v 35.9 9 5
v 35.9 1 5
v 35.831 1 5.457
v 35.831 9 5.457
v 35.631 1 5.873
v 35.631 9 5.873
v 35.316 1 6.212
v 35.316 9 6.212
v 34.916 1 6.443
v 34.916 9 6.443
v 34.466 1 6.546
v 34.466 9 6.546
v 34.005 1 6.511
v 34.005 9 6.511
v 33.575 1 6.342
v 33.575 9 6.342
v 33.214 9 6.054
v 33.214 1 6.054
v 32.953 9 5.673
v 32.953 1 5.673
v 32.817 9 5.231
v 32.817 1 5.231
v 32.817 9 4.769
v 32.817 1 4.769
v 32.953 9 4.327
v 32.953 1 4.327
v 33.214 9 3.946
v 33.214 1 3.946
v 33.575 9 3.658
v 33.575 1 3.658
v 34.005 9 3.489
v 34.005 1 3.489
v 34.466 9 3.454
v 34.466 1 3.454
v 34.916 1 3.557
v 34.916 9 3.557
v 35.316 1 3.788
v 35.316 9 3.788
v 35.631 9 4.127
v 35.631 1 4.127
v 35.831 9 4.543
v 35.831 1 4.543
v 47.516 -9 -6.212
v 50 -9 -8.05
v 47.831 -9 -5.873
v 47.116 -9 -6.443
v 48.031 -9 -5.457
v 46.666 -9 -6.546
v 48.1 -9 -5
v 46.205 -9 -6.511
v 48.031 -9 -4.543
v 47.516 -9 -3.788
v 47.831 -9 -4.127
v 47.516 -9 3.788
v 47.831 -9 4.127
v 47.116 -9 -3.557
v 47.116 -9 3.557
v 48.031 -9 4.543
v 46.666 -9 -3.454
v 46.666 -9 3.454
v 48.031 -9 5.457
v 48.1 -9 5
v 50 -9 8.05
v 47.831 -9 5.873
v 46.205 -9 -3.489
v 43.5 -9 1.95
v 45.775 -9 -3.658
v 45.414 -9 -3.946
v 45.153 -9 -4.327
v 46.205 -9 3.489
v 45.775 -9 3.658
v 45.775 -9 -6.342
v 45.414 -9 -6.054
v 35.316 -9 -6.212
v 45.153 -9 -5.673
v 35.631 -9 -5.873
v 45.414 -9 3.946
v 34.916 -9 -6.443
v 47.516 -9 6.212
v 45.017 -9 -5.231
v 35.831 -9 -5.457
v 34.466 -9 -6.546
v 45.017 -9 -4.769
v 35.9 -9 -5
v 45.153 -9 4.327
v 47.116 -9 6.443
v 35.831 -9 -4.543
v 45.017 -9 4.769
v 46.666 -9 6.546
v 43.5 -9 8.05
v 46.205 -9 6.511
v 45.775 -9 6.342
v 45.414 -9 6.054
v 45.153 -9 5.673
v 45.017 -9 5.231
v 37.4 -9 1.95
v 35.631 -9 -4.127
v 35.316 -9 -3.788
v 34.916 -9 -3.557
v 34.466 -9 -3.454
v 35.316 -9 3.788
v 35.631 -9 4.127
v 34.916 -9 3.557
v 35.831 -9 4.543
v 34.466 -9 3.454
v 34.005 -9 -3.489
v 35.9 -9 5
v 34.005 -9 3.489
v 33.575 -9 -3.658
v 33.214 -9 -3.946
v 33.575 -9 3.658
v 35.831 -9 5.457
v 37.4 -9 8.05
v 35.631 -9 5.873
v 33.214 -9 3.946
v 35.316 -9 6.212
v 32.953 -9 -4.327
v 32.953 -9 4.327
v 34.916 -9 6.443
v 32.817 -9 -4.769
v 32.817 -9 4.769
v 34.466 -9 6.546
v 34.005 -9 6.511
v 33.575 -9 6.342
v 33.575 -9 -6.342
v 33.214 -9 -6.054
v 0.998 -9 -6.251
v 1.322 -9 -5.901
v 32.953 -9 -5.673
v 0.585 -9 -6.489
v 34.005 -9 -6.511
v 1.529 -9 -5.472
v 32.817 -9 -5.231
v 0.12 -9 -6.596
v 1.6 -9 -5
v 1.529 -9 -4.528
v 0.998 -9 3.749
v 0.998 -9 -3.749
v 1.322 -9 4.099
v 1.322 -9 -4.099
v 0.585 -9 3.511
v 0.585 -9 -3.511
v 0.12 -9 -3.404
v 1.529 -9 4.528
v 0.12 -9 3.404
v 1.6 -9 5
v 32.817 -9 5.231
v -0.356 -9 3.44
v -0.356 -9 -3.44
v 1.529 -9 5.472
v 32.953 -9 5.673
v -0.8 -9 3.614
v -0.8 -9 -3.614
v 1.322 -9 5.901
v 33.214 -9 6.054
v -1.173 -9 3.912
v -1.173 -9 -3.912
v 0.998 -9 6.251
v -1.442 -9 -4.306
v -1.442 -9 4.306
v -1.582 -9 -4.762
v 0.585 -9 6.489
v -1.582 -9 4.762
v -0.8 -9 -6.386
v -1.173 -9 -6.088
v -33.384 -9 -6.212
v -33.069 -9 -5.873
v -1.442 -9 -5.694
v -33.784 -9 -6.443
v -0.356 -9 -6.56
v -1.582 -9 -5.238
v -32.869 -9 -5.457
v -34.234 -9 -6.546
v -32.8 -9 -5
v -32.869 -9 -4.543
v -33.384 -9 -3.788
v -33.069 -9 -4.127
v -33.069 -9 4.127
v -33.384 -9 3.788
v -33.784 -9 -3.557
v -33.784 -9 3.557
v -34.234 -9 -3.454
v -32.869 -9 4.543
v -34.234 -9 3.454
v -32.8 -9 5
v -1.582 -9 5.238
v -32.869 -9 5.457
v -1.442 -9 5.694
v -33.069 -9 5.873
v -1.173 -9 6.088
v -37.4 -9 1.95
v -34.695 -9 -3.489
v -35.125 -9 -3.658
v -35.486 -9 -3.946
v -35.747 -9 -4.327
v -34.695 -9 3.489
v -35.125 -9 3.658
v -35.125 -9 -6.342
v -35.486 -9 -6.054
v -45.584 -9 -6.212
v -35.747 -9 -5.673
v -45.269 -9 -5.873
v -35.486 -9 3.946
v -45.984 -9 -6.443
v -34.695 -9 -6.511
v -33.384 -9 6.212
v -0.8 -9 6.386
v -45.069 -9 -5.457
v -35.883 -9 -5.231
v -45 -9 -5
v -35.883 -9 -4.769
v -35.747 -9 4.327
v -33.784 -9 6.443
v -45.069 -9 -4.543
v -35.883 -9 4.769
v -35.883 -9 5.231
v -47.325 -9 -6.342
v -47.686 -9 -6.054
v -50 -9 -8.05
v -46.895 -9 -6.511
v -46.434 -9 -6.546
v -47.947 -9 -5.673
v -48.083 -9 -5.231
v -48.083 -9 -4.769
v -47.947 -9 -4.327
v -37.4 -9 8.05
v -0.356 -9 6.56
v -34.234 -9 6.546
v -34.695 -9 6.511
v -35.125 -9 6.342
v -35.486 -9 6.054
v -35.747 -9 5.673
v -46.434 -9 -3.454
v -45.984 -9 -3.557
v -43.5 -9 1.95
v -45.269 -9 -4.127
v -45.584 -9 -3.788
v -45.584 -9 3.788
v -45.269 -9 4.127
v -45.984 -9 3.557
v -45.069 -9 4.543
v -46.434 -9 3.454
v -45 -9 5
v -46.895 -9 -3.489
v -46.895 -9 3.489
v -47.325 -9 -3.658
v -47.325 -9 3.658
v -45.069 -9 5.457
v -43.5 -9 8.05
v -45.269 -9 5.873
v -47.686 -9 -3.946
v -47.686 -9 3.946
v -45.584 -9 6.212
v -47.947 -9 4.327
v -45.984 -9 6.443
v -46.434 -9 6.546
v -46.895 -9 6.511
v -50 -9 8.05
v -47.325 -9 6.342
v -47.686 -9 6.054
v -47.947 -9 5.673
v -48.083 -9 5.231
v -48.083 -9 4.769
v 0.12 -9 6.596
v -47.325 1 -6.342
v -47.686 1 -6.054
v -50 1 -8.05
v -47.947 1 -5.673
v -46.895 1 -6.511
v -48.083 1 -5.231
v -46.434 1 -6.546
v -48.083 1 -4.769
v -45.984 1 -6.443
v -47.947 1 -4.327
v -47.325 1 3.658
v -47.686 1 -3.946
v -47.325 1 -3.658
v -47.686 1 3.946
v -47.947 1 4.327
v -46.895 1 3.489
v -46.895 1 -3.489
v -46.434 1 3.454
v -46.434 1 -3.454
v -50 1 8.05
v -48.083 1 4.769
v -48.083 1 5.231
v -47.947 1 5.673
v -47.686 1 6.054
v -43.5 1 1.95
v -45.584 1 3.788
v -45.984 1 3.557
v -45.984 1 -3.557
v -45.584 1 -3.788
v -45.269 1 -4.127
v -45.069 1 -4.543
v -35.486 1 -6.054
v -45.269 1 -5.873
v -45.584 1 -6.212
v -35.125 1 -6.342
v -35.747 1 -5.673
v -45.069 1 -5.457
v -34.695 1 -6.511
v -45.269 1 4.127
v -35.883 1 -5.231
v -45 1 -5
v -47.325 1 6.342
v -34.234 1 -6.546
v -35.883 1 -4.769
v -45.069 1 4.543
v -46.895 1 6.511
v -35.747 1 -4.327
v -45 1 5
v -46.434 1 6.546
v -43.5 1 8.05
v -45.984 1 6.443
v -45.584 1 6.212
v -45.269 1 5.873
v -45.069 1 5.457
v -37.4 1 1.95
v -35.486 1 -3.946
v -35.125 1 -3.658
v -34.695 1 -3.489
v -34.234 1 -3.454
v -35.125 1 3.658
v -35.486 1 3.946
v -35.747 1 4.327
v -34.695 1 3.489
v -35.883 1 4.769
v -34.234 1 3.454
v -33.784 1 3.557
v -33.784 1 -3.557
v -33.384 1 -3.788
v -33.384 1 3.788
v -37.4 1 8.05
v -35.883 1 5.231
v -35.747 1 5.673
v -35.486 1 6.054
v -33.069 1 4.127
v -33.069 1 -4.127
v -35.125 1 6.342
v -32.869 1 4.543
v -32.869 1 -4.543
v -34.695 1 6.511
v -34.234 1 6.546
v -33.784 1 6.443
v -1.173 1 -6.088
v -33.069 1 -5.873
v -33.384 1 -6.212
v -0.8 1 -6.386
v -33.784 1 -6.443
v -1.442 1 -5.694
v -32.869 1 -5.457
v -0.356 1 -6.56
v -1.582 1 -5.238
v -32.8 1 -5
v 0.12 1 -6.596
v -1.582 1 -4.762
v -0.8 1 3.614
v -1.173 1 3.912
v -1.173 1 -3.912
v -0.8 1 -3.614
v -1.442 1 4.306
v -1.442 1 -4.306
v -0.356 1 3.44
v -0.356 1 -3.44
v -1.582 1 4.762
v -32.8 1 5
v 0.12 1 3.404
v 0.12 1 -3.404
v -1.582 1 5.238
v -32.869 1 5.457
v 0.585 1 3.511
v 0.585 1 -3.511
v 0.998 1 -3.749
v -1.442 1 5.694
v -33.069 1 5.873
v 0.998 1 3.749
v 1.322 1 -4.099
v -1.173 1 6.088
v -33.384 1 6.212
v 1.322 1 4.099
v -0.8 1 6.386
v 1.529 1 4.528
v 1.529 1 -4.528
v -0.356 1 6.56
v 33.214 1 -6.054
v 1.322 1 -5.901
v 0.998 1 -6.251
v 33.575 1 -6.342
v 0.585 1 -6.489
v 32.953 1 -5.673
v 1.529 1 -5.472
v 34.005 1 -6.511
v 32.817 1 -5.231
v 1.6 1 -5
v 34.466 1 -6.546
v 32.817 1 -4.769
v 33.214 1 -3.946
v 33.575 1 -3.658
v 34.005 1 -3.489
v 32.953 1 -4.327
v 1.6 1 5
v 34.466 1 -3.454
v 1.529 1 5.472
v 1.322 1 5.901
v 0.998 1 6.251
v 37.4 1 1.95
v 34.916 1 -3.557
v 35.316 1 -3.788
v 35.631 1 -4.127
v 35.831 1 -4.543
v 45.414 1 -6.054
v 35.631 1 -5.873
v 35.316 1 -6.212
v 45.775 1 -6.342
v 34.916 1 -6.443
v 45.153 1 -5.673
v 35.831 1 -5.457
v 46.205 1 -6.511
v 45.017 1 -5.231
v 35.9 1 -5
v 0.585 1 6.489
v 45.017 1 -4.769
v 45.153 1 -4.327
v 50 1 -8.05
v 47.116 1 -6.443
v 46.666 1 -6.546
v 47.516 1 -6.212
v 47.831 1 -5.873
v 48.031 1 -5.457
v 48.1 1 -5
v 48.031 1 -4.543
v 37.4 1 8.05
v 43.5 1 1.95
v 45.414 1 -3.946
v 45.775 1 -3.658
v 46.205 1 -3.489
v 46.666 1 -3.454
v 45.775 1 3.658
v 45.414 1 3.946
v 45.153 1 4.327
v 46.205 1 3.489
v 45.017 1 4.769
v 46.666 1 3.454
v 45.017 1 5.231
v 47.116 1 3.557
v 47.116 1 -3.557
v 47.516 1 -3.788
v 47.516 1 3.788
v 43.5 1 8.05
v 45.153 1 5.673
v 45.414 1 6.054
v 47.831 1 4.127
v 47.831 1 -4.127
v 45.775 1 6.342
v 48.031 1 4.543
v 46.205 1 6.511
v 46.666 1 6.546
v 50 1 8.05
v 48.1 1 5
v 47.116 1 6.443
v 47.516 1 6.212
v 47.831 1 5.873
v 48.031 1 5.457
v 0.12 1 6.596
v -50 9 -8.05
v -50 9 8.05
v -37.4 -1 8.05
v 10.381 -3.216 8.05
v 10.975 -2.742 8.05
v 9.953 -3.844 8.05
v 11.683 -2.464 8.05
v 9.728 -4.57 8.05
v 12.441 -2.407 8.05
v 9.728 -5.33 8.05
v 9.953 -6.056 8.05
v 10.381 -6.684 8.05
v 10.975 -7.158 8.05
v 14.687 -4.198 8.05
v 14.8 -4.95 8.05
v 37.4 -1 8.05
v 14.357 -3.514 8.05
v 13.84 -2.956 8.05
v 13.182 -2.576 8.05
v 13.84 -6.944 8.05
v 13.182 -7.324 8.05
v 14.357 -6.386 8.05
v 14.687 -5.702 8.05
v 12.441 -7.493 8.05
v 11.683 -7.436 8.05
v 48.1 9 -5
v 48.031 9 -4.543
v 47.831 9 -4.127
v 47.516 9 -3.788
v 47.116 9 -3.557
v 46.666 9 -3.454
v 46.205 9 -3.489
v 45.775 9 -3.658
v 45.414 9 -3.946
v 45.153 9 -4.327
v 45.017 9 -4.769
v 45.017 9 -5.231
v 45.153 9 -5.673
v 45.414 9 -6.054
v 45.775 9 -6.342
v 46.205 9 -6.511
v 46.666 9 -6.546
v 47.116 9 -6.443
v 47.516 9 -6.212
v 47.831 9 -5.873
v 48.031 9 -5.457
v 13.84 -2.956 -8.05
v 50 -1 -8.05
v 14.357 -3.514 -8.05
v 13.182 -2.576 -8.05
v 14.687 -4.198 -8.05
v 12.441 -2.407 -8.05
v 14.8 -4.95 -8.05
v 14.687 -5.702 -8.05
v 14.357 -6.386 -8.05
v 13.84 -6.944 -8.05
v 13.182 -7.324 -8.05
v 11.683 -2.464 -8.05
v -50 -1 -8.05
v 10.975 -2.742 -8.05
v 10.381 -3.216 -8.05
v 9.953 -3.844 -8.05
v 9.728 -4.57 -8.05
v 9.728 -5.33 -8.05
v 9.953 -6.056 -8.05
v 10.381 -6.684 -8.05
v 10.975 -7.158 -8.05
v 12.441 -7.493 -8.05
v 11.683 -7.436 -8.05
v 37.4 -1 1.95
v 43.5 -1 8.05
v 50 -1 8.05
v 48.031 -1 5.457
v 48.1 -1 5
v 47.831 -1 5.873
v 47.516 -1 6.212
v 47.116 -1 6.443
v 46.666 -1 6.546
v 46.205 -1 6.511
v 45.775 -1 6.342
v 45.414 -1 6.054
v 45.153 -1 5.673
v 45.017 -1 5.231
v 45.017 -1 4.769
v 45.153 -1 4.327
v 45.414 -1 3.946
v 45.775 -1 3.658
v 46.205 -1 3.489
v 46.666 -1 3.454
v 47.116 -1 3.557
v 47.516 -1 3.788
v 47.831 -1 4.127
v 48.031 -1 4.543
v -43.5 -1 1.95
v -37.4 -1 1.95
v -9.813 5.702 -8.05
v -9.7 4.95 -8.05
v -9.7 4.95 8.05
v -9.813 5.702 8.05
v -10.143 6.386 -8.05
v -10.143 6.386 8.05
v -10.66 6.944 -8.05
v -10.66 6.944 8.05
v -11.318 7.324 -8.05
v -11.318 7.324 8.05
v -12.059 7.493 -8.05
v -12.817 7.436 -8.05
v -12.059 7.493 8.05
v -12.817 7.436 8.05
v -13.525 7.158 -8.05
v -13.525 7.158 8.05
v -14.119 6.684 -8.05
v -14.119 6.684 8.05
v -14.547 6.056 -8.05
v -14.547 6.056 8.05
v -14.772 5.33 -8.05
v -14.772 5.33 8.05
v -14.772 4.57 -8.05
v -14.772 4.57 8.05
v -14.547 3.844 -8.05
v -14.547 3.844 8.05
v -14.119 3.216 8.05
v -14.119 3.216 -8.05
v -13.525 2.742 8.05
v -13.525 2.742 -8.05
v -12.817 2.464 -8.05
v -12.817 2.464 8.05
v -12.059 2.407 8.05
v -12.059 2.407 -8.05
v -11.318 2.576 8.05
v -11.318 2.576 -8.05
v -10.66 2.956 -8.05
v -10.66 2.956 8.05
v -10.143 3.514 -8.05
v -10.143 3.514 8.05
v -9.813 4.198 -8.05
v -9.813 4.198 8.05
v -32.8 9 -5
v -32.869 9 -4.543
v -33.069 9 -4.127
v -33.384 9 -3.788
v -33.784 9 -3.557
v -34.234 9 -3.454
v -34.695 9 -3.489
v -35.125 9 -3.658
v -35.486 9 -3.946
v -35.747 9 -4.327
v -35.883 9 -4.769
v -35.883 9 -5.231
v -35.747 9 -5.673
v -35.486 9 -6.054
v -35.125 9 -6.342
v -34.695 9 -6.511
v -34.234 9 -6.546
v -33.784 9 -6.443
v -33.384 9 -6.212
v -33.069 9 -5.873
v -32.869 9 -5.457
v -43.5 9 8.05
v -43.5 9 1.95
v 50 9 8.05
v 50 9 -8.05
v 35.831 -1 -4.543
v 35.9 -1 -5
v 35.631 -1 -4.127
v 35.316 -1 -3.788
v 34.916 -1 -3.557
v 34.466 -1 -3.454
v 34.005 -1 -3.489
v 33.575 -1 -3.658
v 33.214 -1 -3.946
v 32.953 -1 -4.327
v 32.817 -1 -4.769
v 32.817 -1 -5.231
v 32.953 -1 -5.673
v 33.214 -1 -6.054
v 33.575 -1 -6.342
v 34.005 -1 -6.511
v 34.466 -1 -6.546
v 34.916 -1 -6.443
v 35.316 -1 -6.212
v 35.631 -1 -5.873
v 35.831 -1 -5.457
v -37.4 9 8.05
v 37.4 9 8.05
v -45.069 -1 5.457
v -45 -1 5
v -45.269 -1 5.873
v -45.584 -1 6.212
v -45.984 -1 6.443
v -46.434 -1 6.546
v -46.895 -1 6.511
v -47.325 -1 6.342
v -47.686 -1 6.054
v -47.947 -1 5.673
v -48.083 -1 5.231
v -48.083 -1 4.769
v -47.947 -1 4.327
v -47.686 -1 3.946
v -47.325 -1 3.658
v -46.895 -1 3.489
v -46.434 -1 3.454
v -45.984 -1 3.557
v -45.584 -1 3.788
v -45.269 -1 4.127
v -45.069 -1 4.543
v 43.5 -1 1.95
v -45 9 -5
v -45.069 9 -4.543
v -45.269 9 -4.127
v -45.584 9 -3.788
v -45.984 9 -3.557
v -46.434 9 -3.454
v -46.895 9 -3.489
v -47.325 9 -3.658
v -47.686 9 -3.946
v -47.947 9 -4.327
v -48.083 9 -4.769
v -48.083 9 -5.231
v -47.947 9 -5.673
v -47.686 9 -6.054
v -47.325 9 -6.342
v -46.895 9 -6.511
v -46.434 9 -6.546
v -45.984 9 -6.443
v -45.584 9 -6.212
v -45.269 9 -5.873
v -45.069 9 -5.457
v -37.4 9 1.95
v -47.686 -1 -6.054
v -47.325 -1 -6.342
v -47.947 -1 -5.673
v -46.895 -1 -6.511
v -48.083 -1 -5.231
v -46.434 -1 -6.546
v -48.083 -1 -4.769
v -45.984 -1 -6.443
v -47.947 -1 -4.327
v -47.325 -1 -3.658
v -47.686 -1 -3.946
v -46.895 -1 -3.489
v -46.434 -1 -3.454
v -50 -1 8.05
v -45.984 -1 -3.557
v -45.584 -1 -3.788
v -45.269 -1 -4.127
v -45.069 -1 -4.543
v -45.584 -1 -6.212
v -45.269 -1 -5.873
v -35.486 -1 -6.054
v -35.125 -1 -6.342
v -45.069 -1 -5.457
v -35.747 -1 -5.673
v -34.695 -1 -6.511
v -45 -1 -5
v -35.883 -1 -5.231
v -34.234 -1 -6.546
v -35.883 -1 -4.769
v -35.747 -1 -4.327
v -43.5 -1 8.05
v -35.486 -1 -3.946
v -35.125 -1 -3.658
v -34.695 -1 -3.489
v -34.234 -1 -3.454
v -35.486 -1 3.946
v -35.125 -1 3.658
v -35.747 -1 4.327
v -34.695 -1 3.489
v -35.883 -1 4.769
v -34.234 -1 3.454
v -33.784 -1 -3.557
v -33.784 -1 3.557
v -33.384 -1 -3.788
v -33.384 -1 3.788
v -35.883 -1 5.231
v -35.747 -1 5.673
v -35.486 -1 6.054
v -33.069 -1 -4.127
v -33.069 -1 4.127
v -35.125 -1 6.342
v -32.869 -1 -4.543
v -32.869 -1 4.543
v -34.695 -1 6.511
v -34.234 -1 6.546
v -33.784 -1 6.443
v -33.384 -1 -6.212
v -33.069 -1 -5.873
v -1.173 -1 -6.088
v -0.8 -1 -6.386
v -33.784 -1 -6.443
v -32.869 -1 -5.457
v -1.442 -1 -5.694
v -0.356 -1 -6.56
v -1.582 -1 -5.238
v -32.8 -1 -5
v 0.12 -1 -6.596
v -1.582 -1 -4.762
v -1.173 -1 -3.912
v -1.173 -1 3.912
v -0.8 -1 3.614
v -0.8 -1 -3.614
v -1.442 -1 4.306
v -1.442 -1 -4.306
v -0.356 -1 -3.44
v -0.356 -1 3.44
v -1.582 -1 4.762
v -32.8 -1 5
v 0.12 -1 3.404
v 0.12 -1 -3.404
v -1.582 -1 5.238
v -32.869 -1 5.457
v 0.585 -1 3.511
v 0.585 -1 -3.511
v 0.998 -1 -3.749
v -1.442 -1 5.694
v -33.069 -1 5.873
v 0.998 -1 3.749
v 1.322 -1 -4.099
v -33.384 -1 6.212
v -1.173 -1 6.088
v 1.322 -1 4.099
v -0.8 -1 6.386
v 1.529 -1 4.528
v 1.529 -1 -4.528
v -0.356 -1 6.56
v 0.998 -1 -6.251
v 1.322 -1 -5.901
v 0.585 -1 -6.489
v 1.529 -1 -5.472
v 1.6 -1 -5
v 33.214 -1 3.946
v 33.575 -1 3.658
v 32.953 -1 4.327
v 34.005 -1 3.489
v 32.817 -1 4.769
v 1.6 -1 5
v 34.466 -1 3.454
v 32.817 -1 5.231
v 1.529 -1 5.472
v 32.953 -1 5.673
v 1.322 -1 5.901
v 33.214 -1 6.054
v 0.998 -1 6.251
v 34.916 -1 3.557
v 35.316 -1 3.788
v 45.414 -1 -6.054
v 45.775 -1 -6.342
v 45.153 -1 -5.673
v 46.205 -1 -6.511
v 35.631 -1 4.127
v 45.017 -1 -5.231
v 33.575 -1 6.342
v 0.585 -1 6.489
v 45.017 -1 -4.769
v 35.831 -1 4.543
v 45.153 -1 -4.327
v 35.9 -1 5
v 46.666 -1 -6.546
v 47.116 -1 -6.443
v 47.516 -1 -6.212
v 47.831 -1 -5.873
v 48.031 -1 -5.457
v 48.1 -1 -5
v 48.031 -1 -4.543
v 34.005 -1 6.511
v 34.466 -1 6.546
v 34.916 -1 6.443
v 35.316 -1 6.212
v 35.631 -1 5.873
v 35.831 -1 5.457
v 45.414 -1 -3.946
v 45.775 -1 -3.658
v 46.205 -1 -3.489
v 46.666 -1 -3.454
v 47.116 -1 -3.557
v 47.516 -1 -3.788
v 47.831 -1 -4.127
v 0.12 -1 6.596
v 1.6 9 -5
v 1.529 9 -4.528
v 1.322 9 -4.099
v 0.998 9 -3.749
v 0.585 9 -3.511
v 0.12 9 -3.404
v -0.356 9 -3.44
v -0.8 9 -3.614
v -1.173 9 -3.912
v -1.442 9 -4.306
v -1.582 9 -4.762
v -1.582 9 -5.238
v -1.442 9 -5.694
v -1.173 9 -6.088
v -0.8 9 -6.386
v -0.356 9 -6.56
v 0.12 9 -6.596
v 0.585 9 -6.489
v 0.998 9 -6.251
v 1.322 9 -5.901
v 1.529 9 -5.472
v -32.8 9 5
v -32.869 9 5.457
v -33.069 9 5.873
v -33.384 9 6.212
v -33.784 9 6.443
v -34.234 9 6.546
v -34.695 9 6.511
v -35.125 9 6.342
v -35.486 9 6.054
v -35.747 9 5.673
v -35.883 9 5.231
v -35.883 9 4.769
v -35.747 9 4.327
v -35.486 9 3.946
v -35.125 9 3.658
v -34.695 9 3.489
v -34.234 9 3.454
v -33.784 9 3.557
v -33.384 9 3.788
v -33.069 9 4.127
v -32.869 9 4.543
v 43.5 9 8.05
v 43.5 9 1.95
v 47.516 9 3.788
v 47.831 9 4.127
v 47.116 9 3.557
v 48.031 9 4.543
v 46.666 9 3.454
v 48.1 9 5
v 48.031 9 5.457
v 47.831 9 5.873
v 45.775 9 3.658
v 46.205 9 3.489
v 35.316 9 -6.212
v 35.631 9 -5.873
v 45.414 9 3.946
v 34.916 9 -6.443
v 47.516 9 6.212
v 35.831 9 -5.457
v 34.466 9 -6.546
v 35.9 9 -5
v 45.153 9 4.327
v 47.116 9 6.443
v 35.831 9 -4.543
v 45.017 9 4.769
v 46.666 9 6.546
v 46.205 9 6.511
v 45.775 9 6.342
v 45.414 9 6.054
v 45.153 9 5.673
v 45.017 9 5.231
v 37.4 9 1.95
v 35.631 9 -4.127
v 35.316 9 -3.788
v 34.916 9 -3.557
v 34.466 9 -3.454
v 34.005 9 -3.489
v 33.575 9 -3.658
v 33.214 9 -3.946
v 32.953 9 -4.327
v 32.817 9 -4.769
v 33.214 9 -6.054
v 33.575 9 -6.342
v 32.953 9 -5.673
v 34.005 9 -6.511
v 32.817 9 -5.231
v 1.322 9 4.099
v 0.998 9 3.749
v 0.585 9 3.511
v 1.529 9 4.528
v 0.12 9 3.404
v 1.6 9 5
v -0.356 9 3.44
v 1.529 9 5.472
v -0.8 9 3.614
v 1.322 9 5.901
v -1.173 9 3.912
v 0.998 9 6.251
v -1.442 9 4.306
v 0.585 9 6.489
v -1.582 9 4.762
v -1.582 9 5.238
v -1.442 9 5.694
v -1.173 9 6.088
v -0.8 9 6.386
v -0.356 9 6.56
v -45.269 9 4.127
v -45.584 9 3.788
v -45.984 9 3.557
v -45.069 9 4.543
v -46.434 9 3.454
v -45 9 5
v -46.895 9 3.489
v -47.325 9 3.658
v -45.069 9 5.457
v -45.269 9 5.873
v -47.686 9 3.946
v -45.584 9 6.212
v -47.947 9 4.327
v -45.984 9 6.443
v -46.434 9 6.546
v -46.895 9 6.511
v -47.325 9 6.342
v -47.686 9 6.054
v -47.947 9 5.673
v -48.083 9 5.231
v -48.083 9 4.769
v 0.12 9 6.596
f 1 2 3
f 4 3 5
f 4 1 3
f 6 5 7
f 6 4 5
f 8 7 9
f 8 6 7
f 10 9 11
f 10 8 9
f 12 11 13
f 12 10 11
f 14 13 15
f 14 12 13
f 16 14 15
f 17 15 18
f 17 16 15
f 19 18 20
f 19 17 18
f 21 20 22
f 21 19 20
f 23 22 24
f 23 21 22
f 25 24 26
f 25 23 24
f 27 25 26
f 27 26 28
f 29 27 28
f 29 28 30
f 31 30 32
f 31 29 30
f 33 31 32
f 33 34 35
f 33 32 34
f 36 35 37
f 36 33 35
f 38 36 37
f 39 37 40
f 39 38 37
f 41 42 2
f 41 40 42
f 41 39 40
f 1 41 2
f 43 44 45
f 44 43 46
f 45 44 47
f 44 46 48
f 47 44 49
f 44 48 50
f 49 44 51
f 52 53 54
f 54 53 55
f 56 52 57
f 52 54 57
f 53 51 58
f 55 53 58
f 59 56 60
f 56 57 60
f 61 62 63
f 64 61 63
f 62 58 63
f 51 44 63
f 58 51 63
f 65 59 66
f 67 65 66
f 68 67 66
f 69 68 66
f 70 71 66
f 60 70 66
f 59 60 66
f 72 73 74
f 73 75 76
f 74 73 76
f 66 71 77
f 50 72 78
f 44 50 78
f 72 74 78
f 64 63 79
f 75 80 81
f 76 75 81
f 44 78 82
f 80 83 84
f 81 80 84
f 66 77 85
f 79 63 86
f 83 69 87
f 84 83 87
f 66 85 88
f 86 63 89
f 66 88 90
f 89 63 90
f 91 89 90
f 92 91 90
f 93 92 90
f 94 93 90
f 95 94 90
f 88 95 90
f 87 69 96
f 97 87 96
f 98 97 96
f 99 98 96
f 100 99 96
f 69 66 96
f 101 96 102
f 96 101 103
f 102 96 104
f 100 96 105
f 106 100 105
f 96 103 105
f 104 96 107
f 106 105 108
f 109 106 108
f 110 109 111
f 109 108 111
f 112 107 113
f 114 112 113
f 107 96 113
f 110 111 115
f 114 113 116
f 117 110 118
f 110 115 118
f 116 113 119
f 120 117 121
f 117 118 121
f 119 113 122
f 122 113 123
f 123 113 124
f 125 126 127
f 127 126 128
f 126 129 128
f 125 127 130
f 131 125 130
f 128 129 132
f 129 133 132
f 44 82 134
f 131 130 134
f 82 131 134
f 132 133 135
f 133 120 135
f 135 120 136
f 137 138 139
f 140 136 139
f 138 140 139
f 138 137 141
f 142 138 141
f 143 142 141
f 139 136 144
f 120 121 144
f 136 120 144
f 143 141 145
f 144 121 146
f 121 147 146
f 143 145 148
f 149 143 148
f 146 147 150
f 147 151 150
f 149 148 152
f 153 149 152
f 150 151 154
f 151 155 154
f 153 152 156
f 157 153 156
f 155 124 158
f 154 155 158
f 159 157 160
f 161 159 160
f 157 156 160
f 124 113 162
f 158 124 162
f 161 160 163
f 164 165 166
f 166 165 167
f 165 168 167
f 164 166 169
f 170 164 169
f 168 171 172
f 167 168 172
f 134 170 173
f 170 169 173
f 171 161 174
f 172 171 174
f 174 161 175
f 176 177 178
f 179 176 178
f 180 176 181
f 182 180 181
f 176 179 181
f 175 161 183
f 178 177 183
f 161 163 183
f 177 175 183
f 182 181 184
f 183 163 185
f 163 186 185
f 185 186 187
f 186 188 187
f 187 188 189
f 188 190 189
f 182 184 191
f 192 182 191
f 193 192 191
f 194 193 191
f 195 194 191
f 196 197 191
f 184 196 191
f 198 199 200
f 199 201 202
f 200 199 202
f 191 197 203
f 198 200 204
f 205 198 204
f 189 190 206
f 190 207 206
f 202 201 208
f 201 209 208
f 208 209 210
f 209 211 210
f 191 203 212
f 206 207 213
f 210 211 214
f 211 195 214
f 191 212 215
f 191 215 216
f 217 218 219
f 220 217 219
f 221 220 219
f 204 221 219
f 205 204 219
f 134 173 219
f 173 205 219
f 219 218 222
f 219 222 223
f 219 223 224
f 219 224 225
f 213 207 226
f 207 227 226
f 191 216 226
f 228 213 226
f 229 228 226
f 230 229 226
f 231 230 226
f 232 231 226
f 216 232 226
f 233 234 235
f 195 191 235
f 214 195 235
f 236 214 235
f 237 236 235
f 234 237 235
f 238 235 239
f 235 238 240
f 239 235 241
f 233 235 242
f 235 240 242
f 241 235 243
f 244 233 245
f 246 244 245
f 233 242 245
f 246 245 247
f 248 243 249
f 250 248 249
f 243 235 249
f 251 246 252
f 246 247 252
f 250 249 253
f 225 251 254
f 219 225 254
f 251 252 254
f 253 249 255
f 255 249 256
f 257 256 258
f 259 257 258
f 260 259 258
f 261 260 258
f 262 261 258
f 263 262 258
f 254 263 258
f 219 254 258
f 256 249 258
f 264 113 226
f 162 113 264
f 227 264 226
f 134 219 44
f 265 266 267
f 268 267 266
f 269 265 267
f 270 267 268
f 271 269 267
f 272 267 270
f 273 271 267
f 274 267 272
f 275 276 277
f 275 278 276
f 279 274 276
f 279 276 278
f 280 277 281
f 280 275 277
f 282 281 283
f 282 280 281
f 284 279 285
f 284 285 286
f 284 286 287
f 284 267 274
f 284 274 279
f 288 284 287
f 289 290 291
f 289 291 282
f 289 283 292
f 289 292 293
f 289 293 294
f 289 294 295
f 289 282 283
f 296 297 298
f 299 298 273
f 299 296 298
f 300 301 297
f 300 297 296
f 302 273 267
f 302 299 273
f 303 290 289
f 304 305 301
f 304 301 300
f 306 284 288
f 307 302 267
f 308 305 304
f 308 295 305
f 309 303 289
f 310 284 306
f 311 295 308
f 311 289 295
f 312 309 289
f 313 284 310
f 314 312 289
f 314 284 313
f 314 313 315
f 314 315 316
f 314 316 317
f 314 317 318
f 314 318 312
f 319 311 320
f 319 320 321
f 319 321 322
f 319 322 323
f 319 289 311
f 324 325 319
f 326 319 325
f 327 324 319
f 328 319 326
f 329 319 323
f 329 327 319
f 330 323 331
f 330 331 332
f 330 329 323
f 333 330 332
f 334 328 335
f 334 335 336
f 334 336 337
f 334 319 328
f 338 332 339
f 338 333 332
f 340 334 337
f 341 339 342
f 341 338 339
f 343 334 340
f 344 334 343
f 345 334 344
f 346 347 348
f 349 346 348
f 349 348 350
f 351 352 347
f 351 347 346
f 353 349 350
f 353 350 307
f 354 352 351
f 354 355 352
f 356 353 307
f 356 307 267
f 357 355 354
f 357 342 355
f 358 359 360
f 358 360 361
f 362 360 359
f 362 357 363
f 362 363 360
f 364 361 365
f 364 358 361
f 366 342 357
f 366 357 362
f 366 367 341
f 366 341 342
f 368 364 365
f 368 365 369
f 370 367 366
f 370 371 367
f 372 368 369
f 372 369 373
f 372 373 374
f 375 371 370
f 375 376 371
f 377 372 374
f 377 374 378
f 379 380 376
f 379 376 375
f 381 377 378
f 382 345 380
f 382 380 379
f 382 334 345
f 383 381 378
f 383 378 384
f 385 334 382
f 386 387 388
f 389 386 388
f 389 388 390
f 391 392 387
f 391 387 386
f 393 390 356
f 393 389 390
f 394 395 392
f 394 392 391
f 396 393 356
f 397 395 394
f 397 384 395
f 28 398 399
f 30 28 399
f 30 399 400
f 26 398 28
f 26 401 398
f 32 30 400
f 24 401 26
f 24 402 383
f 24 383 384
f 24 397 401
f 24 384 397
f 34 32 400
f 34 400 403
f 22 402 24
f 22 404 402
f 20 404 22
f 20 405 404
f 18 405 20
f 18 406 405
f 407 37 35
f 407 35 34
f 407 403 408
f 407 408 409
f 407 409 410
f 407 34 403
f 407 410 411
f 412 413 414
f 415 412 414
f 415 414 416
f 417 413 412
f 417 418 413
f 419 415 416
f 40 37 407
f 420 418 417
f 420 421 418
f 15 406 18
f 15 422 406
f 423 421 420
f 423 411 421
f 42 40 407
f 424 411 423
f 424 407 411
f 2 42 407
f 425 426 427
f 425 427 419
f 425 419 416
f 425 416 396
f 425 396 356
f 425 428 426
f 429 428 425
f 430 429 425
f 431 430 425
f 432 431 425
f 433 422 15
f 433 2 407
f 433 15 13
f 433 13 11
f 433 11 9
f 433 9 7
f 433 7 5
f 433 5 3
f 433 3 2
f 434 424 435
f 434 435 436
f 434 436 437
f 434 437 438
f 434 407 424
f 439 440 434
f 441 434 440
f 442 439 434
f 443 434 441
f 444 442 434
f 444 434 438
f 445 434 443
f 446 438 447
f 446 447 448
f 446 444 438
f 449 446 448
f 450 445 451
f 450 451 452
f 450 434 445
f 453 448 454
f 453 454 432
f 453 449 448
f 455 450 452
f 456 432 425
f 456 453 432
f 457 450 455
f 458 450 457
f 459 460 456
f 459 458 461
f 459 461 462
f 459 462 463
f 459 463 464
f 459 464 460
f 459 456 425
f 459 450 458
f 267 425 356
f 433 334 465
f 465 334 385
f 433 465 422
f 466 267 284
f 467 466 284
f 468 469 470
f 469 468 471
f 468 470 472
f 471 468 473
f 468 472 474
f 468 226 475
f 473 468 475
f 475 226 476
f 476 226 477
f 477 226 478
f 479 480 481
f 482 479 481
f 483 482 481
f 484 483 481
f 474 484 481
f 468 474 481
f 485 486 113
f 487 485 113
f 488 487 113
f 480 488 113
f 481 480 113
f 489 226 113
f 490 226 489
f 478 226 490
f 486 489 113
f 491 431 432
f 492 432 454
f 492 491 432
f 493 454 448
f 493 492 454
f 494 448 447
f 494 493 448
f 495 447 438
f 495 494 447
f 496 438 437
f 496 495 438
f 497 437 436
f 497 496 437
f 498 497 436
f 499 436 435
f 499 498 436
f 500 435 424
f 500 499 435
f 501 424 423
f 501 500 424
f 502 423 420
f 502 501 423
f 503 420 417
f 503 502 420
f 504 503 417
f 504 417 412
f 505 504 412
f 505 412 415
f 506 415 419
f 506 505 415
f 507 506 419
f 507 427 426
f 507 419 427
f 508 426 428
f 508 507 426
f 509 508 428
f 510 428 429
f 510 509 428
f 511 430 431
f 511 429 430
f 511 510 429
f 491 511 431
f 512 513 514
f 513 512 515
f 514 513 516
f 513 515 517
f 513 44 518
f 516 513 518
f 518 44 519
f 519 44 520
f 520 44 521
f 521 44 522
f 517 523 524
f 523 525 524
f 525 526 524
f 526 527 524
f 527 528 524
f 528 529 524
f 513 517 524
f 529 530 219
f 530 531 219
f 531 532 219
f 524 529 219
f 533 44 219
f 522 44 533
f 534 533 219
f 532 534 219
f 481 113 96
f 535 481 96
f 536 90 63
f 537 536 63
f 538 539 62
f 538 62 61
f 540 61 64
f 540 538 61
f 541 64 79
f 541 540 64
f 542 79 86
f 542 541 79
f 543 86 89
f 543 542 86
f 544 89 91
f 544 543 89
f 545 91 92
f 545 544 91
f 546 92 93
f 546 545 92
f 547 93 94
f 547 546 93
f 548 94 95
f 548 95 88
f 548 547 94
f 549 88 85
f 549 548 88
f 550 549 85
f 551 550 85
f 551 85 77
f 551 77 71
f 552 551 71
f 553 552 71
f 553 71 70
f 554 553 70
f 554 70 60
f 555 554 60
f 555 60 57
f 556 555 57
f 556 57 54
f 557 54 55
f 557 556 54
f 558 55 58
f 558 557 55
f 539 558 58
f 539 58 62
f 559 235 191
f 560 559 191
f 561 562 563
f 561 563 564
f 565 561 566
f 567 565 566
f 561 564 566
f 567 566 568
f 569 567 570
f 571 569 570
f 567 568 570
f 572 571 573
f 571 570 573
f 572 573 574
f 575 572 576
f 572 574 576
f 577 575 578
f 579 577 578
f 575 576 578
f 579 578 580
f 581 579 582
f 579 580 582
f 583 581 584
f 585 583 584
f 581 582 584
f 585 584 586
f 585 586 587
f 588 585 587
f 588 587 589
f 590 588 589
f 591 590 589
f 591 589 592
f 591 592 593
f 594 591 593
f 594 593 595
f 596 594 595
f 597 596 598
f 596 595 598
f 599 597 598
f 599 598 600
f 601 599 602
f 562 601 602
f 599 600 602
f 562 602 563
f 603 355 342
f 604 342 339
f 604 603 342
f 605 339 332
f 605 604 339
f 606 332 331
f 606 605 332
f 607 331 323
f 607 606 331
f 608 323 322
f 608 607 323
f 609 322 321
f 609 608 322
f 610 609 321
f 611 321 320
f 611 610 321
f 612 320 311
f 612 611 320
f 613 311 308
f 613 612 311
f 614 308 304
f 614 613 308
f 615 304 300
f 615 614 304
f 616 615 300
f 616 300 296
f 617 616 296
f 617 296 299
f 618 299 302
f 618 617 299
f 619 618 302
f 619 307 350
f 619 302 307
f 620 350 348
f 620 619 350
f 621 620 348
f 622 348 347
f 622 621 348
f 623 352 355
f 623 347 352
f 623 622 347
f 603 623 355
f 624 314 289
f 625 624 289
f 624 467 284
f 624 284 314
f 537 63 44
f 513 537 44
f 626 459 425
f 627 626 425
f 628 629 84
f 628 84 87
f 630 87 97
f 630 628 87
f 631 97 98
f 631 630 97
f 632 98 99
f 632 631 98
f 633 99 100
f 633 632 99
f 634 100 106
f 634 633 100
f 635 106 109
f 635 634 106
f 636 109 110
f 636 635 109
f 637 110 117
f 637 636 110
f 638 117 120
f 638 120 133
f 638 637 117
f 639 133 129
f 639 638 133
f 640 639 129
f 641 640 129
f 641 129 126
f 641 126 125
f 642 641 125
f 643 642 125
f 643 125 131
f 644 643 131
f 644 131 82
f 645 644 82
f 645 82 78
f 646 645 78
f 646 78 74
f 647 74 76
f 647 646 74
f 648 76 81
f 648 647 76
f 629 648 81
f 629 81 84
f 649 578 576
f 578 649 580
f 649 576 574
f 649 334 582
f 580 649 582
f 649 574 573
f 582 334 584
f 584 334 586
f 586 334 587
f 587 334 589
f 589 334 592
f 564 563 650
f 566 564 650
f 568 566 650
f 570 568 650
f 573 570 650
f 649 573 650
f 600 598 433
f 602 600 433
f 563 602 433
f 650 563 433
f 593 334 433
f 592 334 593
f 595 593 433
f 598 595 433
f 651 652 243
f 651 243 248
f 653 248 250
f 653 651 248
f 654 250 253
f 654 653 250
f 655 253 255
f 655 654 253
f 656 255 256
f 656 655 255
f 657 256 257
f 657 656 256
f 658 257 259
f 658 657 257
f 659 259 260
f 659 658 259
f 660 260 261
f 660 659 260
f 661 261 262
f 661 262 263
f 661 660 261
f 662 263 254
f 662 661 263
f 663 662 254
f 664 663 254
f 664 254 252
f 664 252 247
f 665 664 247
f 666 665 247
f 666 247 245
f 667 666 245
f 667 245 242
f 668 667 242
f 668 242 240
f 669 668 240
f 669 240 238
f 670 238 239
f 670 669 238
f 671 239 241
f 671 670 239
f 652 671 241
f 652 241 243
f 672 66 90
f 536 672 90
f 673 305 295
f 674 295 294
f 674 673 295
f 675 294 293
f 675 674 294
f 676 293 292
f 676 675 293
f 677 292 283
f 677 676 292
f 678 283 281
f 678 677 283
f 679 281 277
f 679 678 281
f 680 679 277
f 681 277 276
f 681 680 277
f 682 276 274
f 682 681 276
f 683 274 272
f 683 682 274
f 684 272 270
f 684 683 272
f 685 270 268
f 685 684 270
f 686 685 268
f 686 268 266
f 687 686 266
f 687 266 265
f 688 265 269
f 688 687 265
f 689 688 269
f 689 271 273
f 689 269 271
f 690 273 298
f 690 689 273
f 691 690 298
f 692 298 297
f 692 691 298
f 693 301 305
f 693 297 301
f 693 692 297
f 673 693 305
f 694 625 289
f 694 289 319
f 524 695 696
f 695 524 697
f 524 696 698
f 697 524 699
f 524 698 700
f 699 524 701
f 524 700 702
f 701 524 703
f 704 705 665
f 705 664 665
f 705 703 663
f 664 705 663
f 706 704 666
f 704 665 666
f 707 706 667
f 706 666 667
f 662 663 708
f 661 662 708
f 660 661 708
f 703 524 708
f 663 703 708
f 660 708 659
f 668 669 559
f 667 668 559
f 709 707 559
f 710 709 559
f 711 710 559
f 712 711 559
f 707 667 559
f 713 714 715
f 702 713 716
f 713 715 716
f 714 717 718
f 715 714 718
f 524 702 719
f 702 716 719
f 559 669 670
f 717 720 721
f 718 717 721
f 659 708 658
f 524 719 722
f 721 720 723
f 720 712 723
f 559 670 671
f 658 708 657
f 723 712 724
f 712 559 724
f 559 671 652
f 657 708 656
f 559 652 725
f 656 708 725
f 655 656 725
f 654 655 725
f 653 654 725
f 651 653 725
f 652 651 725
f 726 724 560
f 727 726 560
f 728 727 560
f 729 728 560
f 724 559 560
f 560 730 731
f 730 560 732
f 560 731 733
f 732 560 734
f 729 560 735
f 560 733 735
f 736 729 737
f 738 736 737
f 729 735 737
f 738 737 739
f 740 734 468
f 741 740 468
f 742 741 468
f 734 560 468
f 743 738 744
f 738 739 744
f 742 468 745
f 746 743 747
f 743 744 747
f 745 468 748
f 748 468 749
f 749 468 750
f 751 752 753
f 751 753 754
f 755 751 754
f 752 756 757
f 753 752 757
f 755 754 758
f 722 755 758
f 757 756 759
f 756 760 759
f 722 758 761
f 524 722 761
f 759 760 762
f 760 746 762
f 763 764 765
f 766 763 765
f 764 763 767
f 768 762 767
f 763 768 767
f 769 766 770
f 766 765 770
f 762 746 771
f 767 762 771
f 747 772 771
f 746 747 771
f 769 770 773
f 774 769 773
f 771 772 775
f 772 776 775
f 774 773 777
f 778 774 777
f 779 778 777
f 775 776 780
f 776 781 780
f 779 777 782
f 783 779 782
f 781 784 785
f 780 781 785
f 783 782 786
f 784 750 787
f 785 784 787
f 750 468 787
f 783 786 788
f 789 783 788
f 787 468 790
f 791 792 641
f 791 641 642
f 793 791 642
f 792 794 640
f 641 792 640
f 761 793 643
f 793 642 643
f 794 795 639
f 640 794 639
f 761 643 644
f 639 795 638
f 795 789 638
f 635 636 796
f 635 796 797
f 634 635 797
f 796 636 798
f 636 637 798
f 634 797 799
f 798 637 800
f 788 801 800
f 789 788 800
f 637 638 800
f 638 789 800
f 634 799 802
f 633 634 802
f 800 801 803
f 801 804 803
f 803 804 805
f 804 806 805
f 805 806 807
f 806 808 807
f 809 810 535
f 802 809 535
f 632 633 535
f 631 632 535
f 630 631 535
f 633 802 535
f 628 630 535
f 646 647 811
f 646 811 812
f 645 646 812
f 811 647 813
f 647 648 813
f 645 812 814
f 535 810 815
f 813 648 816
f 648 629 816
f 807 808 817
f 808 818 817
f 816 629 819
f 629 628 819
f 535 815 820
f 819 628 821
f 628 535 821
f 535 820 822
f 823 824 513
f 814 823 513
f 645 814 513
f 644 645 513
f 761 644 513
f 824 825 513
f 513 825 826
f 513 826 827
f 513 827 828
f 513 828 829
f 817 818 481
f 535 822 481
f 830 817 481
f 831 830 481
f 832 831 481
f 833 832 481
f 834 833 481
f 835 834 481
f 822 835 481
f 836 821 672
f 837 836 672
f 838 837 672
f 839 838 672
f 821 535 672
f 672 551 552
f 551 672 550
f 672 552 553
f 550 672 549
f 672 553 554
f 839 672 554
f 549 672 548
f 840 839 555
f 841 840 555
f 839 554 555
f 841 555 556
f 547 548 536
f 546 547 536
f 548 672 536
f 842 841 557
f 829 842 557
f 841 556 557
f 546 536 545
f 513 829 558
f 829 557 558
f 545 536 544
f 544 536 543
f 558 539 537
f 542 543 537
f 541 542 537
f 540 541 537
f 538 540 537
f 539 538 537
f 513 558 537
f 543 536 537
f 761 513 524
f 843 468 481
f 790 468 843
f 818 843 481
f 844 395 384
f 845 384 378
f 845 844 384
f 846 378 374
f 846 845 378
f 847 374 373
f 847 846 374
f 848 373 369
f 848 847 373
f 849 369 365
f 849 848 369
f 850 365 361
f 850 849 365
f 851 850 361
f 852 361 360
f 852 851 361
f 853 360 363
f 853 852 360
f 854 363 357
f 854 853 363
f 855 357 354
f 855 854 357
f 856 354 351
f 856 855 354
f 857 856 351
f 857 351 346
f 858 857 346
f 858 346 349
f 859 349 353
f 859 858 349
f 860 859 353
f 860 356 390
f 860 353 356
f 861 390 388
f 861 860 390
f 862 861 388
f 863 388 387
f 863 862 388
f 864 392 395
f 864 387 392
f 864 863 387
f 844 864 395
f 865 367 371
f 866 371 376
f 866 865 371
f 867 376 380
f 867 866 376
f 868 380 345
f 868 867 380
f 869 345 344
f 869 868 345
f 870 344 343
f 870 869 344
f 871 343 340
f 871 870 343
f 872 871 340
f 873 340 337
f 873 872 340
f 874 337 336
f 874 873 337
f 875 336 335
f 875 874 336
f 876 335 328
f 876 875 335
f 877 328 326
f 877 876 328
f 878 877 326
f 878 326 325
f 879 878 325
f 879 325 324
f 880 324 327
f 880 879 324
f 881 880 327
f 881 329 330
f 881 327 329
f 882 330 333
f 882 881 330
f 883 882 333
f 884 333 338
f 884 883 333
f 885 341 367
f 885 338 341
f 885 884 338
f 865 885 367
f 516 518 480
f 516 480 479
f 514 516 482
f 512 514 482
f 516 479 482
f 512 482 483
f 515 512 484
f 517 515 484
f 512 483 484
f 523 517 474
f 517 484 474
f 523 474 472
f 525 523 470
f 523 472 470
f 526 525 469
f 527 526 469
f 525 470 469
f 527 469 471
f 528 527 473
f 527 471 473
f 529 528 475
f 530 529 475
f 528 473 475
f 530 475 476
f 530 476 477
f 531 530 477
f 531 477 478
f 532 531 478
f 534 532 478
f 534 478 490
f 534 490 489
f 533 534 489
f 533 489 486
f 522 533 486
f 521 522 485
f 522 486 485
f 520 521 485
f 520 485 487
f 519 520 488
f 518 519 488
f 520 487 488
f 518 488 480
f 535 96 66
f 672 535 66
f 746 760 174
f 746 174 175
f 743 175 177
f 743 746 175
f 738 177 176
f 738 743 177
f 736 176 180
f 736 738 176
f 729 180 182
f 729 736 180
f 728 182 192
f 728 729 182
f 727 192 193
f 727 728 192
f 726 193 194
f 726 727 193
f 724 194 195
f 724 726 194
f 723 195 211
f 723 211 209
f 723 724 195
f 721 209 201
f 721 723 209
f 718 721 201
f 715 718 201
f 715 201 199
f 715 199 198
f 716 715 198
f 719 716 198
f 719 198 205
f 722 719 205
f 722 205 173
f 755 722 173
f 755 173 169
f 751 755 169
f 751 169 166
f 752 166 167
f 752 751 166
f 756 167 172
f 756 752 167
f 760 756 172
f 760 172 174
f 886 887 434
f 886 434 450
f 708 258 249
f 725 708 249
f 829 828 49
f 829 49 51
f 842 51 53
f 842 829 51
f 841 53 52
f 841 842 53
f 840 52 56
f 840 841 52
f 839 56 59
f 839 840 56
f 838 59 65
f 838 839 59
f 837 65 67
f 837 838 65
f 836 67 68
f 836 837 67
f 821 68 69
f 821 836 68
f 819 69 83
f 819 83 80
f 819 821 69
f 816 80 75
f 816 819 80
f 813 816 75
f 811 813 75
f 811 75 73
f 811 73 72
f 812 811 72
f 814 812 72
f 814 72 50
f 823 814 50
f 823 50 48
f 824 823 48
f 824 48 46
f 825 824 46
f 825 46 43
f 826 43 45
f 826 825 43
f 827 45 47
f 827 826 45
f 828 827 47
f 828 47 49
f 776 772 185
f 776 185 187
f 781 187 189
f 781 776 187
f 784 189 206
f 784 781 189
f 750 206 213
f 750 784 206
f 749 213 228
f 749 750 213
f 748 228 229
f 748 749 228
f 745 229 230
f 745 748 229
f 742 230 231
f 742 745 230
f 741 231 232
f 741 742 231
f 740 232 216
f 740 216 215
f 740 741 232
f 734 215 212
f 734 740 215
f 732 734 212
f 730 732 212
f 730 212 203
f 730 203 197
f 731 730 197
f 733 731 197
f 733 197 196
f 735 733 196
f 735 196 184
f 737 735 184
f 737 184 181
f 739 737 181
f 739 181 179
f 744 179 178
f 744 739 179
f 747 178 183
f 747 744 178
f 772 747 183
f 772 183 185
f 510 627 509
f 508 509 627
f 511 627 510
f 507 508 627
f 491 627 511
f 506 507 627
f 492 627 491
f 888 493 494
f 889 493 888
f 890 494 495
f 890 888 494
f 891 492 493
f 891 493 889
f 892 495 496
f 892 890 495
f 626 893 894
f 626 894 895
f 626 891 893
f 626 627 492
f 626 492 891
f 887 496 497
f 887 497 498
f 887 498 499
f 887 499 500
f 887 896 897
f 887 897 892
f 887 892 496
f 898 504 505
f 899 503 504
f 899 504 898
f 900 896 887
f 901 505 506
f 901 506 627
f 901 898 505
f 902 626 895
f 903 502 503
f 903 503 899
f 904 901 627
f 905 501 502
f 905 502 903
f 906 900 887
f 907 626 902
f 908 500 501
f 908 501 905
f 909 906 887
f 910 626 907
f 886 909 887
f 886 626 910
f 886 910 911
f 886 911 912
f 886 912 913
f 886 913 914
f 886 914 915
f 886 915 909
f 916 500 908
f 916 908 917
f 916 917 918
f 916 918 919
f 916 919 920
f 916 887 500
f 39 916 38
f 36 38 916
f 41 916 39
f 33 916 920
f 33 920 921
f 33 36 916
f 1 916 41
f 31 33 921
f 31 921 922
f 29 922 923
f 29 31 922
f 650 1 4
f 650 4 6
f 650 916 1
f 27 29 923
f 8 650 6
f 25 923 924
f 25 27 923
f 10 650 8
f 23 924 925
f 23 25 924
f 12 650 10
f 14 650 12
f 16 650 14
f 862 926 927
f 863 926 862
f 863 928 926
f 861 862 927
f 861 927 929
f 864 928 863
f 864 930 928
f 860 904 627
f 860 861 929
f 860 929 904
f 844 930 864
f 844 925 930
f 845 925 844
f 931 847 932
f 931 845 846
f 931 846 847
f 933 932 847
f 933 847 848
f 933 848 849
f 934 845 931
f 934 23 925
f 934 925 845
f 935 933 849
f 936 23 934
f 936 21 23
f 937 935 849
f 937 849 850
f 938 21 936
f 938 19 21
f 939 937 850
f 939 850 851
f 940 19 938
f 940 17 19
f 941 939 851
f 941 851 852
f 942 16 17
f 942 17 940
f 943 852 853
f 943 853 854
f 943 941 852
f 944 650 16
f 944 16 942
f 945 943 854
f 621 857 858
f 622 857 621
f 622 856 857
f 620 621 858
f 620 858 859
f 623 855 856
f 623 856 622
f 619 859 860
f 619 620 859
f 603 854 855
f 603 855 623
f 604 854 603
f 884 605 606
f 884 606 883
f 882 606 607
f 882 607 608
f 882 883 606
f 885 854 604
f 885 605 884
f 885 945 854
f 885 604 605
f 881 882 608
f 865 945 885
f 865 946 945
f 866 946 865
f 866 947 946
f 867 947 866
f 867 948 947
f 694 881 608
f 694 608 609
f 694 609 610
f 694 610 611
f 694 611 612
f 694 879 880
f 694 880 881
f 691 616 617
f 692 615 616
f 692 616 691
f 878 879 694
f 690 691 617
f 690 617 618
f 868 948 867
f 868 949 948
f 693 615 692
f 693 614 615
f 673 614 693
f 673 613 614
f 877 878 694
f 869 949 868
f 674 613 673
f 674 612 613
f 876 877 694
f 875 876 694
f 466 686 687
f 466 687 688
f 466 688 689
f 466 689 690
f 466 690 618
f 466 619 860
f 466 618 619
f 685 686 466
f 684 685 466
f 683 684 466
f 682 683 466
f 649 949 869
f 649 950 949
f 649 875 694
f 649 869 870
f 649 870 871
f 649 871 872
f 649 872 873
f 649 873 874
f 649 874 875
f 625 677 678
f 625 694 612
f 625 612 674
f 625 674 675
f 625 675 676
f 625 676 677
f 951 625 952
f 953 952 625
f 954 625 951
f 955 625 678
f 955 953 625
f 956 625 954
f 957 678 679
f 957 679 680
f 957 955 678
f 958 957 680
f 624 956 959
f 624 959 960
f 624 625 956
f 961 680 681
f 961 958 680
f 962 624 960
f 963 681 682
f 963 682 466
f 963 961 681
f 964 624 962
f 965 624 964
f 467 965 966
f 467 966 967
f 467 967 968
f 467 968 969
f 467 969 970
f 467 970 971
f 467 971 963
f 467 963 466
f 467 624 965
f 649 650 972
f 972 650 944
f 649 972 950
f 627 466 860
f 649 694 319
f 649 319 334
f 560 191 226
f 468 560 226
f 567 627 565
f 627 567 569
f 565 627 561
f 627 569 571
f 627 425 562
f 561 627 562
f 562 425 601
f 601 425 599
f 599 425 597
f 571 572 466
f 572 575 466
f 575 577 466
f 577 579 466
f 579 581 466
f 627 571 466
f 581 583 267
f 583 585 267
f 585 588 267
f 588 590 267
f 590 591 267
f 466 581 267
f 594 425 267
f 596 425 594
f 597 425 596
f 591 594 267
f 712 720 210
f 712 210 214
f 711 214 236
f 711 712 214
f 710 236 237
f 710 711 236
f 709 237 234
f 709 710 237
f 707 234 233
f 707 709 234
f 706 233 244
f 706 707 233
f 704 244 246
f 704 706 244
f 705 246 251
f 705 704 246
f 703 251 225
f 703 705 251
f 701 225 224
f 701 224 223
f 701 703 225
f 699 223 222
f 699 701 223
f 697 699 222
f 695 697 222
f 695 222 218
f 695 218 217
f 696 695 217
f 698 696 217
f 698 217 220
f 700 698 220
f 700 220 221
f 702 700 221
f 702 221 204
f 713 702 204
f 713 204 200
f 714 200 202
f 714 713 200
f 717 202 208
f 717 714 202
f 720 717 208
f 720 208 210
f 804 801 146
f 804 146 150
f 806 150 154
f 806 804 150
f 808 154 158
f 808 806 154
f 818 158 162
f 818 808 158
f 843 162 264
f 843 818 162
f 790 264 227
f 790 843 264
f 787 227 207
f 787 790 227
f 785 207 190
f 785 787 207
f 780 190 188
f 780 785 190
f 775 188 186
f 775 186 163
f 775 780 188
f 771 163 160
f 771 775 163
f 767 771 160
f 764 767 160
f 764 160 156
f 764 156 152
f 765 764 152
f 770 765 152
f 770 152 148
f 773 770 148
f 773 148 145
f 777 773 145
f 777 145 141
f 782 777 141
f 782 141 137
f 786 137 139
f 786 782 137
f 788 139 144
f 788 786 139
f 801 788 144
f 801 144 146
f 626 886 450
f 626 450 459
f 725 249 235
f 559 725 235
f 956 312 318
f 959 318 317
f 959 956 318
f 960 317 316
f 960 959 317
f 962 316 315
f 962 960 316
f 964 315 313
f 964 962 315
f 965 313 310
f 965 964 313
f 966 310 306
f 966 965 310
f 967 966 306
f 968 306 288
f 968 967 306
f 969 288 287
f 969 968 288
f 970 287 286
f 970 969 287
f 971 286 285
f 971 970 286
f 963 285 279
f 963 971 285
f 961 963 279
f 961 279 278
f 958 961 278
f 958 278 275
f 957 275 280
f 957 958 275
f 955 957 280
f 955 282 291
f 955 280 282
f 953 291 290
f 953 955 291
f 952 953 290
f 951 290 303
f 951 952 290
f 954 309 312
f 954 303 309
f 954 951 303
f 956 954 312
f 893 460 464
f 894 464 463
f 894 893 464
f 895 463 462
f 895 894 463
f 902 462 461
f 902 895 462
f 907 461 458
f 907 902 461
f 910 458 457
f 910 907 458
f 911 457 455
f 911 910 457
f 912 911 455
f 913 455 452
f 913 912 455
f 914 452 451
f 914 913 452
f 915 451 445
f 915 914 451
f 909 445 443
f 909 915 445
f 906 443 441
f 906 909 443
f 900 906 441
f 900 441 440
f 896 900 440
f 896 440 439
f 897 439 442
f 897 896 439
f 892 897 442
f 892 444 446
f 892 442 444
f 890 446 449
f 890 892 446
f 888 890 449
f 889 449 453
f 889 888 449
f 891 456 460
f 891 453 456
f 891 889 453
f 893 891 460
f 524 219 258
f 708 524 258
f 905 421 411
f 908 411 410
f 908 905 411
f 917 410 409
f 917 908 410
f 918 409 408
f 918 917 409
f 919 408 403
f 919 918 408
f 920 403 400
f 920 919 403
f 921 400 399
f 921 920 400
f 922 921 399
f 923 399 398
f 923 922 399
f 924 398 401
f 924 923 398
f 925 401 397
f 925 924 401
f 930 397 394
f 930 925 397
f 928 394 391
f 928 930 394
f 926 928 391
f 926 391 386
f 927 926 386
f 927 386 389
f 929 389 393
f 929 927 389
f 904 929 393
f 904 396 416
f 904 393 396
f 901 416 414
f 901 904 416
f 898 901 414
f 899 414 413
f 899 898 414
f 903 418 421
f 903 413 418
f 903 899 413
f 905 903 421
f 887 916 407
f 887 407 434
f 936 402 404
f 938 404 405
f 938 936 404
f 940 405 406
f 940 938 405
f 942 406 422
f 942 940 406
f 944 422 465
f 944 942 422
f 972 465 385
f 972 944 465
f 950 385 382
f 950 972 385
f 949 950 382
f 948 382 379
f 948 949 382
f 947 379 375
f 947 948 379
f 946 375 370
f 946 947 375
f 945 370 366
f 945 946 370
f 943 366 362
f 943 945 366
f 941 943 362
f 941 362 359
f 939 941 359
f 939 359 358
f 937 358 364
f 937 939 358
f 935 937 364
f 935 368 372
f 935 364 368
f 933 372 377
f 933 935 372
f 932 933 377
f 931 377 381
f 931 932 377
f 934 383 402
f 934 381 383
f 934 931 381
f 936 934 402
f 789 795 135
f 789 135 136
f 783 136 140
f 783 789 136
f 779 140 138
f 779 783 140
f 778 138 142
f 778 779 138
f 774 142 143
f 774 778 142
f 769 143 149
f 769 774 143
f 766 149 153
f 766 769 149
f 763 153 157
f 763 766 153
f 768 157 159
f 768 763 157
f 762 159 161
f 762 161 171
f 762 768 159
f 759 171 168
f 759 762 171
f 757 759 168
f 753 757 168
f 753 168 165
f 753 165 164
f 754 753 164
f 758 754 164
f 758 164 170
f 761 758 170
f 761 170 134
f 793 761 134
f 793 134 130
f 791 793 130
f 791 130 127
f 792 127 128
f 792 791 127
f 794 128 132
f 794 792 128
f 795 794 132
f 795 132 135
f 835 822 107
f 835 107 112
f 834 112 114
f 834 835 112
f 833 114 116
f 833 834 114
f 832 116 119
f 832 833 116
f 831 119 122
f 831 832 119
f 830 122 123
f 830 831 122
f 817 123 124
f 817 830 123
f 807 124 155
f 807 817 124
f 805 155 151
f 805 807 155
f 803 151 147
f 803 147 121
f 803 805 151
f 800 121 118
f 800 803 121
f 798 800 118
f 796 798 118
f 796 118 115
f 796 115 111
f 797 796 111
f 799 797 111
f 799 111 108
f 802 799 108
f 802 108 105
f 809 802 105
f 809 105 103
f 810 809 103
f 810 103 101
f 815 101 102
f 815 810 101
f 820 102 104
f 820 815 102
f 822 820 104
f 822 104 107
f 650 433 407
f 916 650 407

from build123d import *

# Parameters (mm, degrees)
SKETCH002_W           = 100
SKETCH002_H           = 2
EXTRUDE002_DEPTH      = 10
EXTRUDE002_DEPTH_BACK = 50
SKETCH001_R           = 2.55
EXTRUDE001_DEPTH      = 0.01
EXTRUDE001_DEPTH_BACK = 50.01
SKETCH_R              = 1.55
SKETCH_R_2            = 1.6
EXTRUDE_DEPTH         = 9


with BuildPart() as extrude002:
    # Sketch002 (on Face3 of Cut) → Extrude002 (new body, two sides)
    with BuildSketch(Plane.XY.offset(8.05)) as extrude002_sk:
        Rectangle(SKETCH002_W, SKETCH002_H)
    extrude(amount=EXTRUDE002_DEPTH)
    extrude(extrude002_sk.sketch, amount=-EXTRUDE002_DEPTH_BACK)


with BuildPart() as extrude001:
    # Sketch001 (on Face2 of Extrude) → Extrude001 (new body, two sides)
    with BuildSketch(Plane.XY.offset(8.05)) as extrude001_sk:
        with Locations((-12.25, 4.95)):
            Circle(SKETCH001_R)
        with Locations((12.25, -4.95)):
            Circle(SKETCH001_R)
    extrude(amount=EXTRUDE001_DEPTH)
    extrude(extrude001_sk.sketch, amount=-EXTRUDE001_DEPTH_BACK)


with BuildPart() as cut001:
    # Sketch → Extrude (new body, symmetric)
    with BuildSketch(Plane.XZ):
        Polygon((-37.4, 8.05), (37.4, 8.05), (37.4, 1.95), (43.5, 1.95), (43.5, 8.05), (50, 8.05), (50, -8.05), (-50, -8.05), (-50, 8.05), (-43.5, 8.05), (-43.5, 1.95), (-37.4, 1.95), align=None)
        with Locations((-46.55, 5)):
            Circle(SKETCH_R, mode=Mode.SUBTRACT)
        with Locations((-46.55, -5)):
            Circle(SKETCH_R, mode=Mode.SUBTRACT)
        with Locations((46.55, 5)):
            Circle(SKETCH_R, mode=Mode.SUBTRACT)
        with Locations((46.55, -5)):
            Circle(SKETCH_R, mode=Mode.SUBTRACT)
        with Locations((0, 5)):
            Circle(SKETCH_R_2, mode=Mode.SUBTRACT)
        with Locations((0, -5)):
            Circle(SKETCH_R_2, mode=Mode.SUBTRACT)
        with Locations((-34.35, 5)):
            Circle(SKETCH_R, mode=Mode.SUBTRACT)
        with Locations((-34.35, -5)):
            Circle(SKETCH_R, mode=Mode.SUBTRACT)
        with Locations((34.35, 5)):
            Circle(SKETCH_R, mode=Mode.SUBTRACT)
        with Locations((34.35, -5)):
            Circle(SKETCH_R, mode=Mode.SUBTRACT)
    extrude(amount=EXTRUDE_DEPTH, both=True)

    # Cut: cut Extrude001
    add(extrude001.part, mode=Mode.SUBTRACT)

    # Cut001: cut Extrude002
    add(extrude002.part, mode=Mode.SUBTRACT)


solid = cut001.part
